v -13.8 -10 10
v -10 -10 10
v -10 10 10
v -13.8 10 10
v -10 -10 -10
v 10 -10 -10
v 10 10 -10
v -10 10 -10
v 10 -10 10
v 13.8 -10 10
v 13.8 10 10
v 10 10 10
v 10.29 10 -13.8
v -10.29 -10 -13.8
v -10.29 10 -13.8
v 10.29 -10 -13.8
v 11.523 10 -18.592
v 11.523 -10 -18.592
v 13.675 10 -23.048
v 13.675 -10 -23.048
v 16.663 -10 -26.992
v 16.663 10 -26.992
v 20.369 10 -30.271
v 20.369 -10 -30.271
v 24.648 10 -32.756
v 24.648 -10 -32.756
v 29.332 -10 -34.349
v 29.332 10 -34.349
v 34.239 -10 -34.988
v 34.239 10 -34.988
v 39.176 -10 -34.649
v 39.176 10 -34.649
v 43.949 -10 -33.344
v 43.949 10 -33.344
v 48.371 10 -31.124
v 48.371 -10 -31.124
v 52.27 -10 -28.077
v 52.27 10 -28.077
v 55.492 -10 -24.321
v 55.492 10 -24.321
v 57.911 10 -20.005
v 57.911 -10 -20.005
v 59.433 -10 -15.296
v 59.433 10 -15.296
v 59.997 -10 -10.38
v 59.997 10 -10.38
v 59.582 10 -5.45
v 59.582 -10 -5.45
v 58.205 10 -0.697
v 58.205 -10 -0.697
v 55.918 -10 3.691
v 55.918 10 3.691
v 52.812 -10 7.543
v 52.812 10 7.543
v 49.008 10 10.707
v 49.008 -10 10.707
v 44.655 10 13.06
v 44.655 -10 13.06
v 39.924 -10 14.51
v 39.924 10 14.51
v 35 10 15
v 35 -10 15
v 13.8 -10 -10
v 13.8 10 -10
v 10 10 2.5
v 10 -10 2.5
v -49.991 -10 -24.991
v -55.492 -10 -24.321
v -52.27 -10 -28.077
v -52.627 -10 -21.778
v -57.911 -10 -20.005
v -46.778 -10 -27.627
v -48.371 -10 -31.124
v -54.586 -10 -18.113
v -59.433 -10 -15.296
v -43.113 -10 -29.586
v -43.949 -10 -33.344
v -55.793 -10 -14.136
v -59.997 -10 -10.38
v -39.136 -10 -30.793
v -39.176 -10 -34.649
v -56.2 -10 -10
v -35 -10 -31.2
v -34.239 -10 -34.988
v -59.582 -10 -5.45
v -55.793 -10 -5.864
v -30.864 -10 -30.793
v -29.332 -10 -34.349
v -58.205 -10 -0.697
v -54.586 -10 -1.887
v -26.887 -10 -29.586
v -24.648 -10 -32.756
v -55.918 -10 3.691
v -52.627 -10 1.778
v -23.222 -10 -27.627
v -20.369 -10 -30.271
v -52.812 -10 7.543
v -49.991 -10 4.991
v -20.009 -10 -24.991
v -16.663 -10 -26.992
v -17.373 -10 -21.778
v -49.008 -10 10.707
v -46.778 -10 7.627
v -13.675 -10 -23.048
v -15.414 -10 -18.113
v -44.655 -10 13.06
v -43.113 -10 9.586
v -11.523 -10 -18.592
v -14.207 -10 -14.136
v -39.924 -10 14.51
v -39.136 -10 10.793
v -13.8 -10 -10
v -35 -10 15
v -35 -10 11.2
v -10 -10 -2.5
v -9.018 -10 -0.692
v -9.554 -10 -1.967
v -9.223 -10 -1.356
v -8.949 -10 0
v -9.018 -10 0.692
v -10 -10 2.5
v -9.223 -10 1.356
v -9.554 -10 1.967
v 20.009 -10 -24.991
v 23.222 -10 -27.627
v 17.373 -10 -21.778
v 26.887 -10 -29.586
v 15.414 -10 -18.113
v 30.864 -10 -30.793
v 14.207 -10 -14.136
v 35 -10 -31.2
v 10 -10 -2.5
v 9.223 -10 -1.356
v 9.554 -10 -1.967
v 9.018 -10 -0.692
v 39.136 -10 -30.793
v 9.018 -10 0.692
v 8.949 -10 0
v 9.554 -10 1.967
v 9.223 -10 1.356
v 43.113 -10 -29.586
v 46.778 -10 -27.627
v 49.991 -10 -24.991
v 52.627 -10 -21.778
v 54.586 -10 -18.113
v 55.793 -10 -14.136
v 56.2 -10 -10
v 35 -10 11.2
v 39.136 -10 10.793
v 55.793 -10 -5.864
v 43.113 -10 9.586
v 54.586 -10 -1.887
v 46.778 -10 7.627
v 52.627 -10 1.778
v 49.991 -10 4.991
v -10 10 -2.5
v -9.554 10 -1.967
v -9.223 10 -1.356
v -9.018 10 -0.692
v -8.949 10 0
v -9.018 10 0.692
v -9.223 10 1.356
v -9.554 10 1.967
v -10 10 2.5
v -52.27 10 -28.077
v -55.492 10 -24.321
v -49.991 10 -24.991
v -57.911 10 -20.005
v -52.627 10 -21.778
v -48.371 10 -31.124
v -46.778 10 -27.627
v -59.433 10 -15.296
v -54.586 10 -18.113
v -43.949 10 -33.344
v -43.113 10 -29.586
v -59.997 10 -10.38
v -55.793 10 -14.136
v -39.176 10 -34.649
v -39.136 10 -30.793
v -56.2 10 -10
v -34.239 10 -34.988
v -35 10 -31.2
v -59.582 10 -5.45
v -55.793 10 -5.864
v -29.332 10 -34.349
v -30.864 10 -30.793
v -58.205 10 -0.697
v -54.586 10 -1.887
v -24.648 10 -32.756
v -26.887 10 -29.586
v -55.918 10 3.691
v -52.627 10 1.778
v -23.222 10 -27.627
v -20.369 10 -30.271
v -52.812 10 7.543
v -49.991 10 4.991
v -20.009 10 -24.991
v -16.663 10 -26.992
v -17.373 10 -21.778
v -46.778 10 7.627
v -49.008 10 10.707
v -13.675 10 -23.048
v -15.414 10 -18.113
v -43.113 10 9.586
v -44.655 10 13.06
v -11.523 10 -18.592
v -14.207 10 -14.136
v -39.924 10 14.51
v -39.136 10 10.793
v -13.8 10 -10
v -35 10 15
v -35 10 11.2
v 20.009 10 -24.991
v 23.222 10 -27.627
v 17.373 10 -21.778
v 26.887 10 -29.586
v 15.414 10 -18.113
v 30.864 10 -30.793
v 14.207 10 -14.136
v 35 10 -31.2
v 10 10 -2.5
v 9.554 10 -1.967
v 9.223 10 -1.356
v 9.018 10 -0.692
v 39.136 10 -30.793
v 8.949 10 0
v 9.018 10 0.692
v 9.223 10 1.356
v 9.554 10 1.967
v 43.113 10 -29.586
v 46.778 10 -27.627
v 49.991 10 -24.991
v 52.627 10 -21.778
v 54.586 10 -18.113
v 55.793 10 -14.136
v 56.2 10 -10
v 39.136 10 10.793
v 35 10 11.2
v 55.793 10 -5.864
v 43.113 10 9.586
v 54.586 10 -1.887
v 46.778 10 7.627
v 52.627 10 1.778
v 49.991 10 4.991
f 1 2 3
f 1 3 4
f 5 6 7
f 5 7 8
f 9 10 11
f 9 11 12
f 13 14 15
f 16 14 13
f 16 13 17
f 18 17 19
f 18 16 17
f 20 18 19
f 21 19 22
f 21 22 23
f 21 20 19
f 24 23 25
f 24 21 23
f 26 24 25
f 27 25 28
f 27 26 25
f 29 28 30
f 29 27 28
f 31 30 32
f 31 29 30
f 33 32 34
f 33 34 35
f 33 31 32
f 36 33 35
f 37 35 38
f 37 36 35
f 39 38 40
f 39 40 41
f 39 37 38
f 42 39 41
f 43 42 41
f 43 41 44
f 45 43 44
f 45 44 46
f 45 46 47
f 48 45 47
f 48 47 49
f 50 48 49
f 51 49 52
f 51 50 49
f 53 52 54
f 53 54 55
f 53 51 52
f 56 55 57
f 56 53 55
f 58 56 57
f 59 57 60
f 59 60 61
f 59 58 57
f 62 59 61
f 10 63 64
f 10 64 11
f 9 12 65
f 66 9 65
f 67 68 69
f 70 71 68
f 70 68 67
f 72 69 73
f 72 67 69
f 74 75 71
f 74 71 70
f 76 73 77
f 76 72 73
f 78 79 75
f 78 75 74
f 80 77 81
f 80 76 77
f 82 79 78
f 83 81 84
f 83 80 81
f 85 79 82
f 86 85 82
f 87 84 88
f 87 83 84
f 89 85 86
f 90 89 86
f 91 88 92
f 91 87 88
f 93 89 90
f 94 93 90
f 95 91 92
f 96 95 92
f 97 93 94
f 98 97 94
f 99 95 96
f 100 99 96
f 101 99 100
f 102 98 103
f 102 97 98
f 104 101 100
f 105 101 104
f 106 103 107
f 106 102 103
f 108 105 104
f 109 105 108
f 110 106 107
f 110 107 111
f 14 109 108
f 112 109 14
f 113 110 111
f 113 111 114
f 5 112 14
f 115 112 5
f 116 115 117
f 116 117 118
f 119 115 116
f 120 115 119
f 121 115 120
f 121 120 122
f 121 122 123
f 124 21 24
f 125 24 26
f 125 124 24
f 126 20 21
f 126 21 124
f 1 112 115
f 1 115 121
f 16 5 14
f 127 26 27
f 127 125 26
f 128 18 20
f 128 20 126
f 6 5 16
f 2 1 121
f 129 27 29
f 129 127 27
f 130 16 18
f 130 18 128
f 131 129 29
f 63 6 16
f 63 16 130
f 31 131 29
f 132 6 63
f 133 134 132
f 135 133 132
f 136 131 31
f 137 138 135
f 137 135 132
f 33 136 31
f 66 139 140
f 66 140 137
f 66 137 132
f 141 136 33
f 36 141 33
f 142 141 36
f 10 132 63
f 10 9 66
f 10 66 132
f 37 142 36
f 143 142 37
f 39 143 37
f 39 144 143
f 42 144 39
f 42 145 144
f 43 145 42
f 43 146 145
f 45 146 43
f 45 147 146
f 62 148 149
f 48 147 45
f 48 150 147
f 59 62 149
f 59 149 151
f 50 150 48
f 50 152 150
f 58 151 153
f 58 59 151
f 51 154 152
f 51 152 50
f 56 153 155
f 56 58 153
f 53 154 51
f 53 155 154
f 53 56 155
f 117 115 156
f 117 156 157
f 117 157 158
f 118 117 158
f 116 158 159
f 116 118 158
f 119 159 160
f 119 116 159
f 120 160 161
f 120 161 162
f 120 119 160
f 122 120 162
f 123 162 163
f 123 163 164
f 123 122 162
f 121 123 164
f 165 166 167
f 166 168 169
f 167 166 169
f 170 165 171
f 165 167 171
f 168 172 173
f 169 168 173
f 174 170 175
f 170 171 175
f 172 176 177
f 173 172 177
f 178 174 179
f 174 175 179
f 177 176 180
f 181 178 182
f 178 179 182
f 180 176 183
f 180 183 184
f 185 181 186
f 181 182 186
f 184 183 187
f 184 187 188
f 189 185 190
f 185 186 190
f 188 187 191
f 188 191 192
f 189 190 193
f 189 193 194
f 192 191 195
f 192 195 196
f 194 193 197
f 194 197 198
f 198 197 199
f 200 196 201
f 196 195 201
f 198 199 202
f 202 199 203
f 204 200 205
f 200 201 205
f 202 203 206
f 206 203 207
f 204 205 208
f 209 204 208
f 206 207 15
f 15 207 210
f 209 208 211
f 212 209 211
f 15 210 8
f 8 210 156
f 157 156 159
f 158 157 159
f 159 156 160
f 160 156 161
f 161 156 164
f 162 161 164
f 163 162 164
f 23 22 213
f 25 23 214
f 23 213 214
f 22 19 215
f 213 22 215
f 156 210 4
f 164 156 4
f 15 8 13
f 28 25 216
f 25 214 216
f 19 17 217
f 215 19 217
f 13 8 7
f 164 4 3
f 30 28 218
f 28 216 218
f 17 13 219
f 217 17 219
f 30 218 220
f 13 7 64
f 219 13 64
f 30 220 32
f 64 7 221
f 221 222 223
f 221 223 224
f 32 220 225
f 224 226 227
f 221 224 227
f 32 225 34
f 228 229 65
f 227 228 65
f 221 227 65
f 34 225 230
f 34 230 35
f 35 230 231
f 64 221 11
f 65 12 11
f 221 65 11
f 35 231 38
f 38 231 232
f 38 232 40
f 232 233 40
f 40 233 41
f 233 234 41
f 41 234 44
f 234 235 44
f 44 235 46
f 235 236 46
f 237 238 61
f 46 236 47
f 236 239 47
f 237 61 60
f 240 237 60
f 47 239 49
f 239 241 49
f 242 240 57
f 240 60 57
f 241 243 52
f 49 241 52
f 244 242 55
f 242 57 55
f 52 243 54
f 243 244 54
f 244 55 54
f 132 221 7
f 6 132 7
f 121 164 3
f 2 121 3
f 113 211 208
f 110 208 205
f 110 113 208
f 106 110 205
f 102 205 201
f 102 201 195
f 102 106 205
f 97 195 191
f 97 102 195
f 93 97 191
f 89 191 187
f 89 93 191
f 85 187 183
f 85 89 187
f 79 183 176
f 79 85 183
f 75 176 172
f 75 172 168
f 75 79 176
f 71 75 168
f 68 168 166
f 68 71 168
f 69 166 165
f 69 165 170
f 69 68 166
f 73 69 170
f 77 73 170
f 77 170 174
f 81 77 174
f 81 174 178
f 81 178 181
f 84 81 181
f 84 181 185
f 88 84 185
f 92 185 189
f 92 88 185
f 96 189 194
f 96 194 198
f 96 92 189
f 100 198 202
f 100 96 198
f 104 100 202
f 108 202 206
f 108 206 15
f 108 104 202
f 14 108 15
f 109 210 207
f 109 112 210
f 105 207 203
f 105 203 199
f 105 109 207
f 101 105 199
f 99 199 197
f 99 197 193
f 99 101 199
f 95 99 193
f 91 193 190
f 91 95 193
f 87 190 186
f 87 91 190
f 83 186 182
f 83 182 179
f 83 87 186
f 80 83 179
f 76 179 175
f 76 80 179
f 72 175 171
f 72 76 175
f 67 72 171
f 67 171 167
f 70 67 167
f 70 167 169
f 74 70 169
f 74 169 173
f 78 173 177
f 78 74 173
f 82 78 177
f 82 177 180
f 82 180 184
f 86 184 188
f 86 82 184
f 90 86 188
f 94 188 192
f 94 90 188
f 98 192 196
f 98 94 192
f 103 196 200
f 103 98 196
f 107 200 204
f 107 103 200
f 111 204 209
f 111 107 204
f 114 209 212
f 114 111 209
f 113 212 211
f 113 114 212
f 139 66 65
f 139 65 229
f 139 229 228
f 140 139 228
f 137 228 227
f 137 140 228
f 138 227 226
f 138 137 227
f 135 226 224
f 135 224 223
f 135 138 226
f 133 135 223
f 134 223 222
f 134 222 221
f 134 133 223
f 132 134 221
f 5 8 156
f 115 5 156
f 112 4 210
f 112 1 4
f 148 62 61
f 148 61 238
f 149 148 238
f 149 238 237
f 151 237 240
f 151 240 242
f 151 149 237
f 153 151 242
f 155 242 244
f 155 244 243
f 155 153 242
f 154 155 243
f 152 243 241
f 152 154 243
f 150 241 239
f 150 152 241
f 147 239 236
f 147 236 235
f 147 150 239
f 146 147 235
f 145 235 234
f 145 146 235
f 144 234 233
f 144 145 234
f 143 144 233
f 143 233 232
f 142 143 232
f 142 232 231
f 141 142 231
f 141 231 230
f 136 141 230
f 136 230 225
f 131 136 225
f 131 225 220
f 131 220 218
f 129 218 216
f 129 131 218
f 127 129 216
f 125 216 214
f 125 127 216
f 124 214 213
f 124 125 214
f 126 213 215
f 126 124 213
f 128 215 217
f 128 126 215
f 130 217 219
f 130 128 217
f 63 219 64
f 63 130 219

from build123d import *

# Parameters (mm, degrees)
F1_DEPTH = 10


with BuildPart() as f1:
    # F0 (on Front) → F1 (new body, symmetric)
    with BuildSketch(Plane.XZ):
        with BuildLine():
            Line((-35, 11.2), (-35, 15))
            ThreePointArc((-35, 15), (-53.973666, -26.278821), (-10.290488, -13.8))
            Line((-10.290488, -13.8), (0, -13.8))
            Line((0, -13.8), (0, -10))
            Line((0, -10), (-10, -10))
            Line((-10, -10), (-10, -2.5))
            ThreePointArc((-10, -2.5), (-8.94949, 0), (-10, 2.5))
            Line((-10, 2.5), (-10, 10))
            Line((-10, 10), (-13.8, 10))
            Line((-13.8, 10), (-13.8, -10))
            ThreePointArc((-13.8, -10), (-49.990664, -24.990664), (-35, 11.2))
        make_face()
        with BuildLine():
            Line((0, -10), (0, -13.8))
            Line((0, -13.8), (10.290488, -13.8))
            ThreePointArc((10.290488, -13.8), (53.973666, -26.278821), (35, 15))
            Line((35, 15), (35, 11.2))
            ThreePointArc((35, 11.2), (49.990664, -24.990664), (13.8, -10))
            Line((13.8, -10), (13.8, 10))
            Line((13.8, 10), (10, 10))
            Line((10, 10), (10, 2.5))
            ThreePointArc((10, 2.5), (8.94949, 0), (10, -2.5))
            Line((10, -2.5), (10, -10))
            Line((10, -10), (0, -10))
        make_face()
    extrude(amount=F1_DEPTH, both=True)


solid = f1.part
